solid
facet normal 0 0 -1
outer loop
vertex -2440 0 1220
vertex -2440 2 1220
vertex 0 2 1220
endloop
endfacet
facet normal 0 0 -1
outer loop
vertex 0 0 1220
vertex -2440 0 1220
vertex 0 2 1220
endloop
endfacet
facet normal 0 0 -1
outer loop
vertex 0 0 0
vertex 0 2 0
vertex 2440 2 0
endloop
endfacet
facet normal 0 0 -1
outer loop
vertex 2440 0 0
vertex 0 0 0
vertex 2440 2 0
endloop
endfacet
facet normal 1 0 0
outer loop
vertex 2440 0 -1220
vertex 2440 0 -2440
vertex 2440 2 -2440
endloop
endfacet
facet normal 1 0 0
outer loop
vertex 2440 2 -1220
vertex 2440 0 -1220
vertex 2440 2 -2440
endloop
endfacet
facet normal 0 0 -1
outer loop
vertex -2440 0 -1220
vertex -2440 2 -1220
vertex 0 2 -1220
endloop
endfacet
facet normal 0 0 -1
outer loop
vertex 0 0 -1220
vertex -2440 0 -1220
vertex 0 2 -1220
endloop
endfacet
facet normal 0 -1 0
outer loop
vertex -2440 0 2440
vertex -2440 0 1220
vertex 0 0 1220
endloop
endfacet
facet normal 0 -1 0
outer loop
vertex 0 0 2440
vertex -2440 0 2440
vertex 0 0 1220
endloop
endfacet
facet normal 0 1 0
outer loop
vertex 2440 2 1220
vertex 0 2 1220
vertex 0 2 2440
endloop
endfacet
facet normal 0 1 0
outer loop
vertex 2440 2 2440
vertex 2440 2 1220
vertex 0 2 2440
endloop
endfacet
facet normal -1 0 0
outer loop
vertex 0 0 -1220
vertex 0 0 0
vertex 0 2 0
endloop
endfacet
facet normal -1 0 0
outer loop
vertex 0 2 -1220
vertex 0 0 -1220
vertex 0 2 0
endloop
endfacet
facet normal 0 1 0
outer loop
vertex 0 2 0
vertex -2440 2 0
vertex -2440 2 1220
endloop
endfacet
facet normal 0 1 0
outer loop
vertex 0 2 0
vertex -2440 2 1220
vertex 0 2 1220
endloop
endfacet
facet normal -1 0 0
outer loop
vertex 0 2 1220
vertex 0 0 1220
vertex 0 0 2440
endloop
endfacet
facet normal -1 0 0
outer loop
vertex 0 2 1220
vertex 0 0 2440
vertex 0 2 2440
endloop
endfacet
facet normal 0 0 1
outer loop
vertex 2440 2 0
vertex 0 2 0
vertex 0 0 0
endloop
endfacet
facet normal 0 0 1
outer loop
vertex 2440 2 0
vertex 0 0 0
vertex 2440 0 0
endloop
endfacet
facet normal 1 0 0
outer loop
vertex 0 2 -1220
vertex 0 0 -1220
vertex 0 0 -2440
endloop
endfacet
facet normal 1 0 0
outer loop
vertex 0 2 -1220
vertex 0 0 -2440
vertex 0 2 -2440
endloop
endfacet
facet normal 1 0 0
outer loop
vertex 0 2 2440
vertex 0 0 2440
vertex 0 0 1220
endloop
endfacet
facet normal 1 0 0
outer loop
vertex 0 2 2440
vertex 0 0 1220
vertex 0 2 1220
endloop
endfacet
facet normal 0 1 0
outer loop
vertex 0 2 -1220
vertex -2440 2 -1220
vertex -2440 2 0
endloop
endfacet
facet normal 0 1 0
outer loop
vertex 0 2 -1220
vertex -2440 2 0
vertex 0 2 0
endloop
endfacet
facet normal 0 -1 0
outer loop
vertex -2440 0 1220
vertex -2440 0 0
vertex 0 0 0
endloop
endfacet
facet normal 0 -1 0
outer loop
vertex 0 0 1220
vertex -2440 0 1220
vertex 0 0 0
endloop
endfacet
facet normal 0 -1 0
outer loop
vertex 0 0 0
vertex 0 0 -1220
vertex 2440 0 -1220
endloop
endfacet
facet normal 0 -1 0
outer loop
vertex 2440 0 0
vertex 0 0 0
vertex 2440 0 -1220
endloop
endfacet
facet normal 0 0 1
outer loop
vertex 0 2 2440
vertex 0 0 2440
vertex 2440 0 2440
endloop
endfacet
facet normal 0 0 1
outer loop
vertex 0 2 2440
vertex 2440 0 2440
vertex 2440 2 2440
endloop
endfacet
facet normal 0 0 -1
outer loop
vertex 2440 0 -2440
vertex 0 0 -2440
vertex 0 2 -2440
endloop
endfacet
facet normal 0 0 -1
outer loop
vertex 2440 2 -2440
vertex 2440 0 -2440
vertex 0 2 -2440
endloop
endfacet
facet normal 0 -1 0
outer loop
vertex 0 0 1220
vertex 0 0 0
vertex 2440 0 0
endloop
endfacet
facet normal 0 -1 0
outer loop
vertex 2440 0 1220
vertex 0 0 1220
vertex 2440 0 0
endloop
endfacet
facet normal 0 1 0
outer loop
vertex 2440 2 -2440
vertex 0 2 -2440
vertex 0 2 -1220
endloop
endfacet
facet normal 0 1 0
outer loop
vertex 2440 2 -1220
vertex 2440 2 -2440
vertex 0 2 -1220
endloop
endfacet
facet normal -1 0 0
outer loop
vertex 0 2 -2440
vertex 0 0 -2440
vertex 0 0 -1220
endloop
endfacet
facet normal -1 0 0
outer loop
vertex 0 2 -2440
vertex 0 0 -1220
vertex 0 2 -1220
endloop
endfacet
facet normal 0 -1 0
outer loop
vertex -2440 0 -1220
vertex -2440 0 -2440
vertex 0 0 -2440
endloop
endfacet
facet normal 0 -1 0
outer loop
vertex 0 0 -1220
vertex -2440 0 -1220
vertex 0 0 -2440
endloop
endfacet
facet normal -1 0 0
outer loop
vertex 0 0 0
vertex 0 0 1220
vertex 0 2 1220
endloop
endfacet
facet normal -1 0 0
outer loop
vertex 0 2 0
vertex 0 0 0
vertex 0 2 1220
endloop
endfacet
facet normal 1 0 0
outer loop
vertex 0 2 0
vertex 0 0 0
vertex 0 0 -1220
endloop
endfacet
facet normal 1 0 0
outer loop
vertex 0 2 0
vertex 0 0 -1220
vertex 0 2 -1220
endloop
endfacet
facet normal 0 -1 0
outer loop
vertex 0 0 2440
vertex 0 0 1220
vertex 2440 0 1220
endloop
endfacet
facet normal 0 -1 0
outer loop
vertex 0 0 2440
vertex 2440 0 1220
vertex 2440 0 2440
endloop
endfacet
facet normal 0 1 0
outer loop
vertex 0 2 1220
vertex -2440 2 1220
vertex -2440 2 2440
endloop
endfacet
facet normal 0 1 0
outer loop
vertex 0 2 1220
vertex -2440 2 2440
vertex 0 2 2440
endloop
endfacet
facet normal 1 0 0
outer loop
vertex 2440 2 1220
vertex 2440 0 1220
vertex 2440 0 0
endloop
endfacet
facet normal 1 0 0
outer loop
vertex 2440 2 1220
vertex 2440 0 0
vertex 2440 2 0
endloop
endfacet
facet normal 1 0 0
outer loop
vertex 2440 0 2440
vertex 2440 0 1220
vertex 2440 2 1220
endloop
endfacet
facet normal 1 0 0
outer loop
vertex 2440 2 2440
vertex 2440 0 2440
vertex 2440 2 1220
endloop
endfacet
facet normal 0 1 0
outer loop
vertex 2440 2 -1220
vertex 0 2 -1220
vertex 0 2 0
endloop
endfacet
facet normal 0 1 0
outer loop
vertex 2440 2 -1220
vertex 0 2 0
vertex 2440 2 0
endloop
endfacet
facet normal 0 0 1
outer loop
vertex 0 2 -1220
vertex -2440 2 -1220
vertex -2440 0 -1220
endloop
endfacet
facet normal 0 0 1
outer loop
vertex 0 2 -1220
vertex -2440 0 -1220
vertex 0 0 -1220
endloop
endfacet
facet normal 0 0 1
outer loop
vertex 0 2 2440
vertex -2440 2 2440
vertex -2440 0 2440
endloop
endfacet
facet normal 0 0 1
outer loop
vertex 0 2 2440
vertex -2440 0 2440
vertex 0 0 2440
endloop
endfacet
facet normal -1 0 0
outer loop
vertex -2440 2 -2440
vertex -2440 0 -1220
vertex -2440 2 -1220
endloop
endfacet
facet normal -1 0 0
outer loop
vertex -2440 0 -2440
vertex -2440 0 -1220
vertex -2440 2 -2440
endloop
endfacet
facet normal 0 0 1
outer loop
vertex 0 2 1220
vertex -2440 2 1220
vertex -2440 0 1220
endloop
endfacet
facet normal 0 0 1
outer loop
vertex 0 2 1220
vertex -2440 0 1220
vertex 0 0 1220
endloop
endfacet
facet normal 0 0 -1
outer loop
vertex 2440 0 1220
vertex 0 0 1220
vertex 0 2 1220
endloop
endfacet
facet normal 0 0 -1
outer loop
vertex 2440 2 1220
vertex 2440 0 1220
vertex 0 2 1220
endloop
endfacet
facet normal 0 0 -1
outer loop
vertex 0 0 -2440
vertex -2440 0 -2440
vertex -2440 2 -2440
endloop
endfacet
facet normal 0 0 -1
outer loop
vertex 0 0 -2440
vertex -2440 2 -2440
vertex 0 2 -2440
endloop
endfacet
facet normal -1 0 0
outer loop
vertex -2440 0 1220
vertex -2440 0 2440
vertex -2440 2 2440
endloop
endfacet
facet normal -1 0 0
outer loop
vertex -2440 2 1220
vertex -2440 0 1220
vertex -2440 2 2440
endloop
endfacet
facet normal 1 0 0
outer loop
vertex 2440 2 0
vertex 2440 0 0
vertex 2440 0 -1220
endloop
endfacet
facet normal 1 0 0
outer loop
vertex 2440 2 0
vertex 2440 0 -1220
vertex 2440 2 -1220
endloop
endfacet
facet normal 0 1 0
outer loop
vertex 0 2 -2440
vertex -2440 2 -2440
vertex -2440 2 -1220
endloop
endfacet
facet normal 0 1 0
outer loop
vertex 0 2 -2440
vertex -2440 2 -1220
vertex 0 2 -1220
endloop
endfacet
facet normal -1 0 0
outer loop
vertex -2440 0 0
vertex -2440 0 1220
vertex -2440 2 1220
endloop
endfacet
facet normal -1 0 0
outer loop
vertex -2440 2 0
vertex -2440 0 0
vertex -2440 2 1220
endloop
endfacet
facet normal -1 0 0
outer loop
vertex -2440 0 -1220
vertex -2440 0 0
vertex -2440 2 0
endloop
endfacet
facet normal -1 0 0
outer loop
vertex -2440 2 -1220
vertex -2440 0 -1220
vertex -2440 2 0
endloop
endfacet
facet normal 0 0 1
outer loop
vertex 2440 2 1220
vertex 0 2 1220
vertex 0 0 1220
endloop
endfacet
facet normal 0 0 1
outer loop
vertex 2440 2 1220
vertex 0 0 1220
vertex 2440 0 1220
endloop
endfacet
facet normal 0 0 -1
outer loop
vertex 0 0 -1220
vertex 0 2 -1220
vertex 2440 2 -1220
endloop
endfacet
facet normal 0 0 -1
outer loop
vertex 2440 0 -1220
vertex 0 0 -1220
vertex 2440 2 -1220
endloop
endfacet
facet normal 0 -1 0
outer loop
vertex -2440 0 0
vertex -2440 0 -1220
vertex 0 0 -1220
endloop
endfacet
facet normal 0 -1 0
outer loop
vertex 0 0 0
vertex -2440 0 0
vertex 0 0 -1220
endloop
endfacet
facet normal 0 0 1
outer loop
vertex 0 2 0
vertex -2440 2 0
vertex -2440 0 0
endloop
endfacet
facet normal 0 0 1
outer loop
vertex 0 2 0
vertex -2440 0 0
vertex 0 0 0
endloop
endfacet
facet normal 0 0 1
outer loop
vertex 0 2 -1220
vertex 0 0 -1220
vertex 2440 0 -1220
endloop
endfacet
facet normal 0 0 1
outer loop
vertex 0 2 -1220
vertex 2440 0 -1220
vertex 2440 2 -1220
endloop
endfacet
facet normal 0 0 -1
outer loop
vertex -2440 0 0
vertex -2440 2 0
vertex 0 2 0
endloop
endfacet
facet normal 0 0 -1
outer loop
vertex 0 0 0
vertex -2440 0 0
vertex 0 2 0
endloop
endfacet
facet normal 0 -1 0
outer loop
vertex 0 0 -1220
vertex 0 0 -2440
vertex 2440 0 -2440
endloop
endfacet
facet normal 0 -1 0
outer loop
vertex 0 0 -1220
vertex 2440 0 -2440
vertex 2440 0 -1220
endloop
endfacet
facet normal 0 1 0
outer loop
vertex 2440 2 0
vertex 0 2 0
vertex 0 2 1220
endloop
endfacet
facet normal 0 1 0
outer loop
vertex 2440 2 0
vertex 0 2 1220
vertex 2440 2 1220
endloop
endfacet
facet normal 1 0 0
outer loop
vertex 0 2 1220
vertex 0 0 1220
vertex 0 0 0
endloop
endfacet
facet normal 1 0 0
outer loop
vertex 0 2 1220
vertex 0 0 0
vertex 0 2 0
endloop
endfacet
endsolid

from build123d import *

# Parameters (mm, degrees)
SKETCH1_W           = 4880
SKETCH1_H           = 4880
BOSS_EXTRUDE1_DEPTH = 2
SPLIT1_START        = -1220
SPLIT1_OUTLINE_W    = 4880
SPLIT1_OUTLINE_H    = 2
SPLIT1_DEPTH        = 3660
SPLIT1_START_2      = -2440
SPLIT1_2_OUTLINE_W  = 2440
SPLIT1_2_OUTLINE_H  = 2
SPLIT1_2_DEPTH      = 1220
SPLIT1_START_3      = 1220
SPLIT1_3_OUTLINE_W  = 2440
SPLIT1_3_OUTLINE_H  = 2
SPLIT1_3_DEPTH      = 1220
SPLIT1_4_OUTLINE_W  = 2
SPLIT1_4_OUTLINE_H  = 1220
SPLIT1_4_DEPTH      = 2440
SPLIT1_5_OUTLINE_W  = 2440
SPLIT1_5_OUTLINE_H  = 2
SPLIT1_5_DEPTH      = 1220
SPLIT1_6_OUTLINE_W  = 2440
SPLIT1_6_OUTLINE_H  = 2
SPLIT1_6_DEPTH      = 1220
SPLIT1_7_OUTLINE_W  = 2440
SPLIT1_7_OUTLINE_H  = 2
SPLIT1_7_DEPTH      = 1220
SPLIT1_8_OUTLINE_W  = 2
SPLIT1_8_OUTLINE_H  = 1220
SPLIT1_8_DEPTH      = 2440
SPLIT1_9_OUTLINE_W  = 2440
SPLIT1_9_OUTLINE_H  = 2
SPLIT1_9_DEPTH      = 1220


# Read off the part's stored shape, not the designer's step: Split1
with BuildPart() as part:
    # Sketch1 → Boss-Extrude1 (new body)
    with BuildSketch(Plane(origin=(0, 0, 0), x_dir=(1, 0, 0), z_dir=(0, 1, 0))):
        Rectangle(SKETCH1_W, SKETCH1_H)
    extrude(amount=BOSS_EXTRUDE1_DEPTH)

    # Split1 outline → Split1 (cut)
    with BuildSketch(Plane.XY.offset(SPLIT1_START)):
        with Locations((0, 1)):
            Rectangle(SPLIT1_OUTLINE_W, SPLIT1_OUTLINE_H)
    extrude(amount=SPLIT1_DEPTH, mode=Mode.SUBTRACT)

    # Split1 2 outline → Split1 2 (cut)
    with BuildSketch(Plane.XY.offset(SPLIT1_START_2)):
        with Locations((1220, 1)):
            Rectangle(SPLIT1_2_OUTLINE_W, SPLIT1_2_OUTLINE_H)
    extrude(amount=SPLIT1_2_DEPTH, mode=Mode.SUBTRACT)


with BuildPart() as body_2:
    # Split1 3 outline → Split1 3 (new body)
    with BuildSketch(Plane.XY.offset(SPLIT1_START_3)):
        with Locations((-1220, 1)):
            Rectangle(SPLIT1_3_OUTLINE_W, SPLIT1_3_OUTLINE_H)
    extrude(amount=SPLIT1_3_DEPTH)


with BuildPart() as body_3:
    # Split1 4 outline → Split1 4 (new body)
    with BuildSketch(Plane.YZ):
        with Locations((1, 1830)):
            Rectangle(SPLIT1_4_OUTLINE_W, SPLIT1_4_OUTLINE_H)
    extrude(amount=SPLIT1_4_DEPTH)


with BuildPart() as body_4:
    # Split1 5 outline → Split1 5 (new body)
    with BuildSketch(Plane.XY.offset(SPLIT1_START)):
        with Locations((1220, 1)):
            Rectangle(SPLIT1_5_OUTLINE_W, SPLIT1_5_OUTLINE_H)
    extrude(amount=SPLIT1_5_DEPTH)


with BuildPart() as body_5:
    # Split1 6 outline → Split1 6 (new body)
    with BuildSketch(Plane.XY):
        with Locations((-1220, 1)):
            Rectangle(SPLIT1_6_OUTLINE_W, SPLIT1_6_OUTLINE_H)
    extrude(amount=SPLIT1_6_DEPTH)


with BuildPart() as body_6:
    # Split1 7 outline → Split1 7 (new body)
    with BuildSketch(Plane.XY):
        with Locations((1220, 1)):
            Rectangle(SPLIT1_7_OUTLINE_W, SPLIT1_7_OUTLINE_H)
    extrude(amount=SPLIT1_7_DEPTH)


with BuildPart() as body_7:
    # Split1 8 outline → Split1 8 (new body)
    with BuildSketch(Plane.YZ):
        with Locations((1, -1830)):
            Rectangle(SPLIT1_8_OUTLINE_W, SPLIT1_8_OUTLINE_H)
    extrude(amount=SPLIT1_8_DEPTH)


with BuildPart() as body_8:
    # Split1 9 outline → Split1 9 (new body)
    with BuildSketch(Plane.XY.offset(SPLIT1_START)):
        with Locations((-1220, 1)):
            Rectangle(SPLIT1_9_OUTLINE_W, SPLIT1_9_OUTLINE_H)
    extrude(amount=SPLIT1_9_DEPTH)


solid = Compound([part.part, body_2.part, body_3.part, body_4.part, body_5.part, body_6.part, body_7.part, body_8.part])
